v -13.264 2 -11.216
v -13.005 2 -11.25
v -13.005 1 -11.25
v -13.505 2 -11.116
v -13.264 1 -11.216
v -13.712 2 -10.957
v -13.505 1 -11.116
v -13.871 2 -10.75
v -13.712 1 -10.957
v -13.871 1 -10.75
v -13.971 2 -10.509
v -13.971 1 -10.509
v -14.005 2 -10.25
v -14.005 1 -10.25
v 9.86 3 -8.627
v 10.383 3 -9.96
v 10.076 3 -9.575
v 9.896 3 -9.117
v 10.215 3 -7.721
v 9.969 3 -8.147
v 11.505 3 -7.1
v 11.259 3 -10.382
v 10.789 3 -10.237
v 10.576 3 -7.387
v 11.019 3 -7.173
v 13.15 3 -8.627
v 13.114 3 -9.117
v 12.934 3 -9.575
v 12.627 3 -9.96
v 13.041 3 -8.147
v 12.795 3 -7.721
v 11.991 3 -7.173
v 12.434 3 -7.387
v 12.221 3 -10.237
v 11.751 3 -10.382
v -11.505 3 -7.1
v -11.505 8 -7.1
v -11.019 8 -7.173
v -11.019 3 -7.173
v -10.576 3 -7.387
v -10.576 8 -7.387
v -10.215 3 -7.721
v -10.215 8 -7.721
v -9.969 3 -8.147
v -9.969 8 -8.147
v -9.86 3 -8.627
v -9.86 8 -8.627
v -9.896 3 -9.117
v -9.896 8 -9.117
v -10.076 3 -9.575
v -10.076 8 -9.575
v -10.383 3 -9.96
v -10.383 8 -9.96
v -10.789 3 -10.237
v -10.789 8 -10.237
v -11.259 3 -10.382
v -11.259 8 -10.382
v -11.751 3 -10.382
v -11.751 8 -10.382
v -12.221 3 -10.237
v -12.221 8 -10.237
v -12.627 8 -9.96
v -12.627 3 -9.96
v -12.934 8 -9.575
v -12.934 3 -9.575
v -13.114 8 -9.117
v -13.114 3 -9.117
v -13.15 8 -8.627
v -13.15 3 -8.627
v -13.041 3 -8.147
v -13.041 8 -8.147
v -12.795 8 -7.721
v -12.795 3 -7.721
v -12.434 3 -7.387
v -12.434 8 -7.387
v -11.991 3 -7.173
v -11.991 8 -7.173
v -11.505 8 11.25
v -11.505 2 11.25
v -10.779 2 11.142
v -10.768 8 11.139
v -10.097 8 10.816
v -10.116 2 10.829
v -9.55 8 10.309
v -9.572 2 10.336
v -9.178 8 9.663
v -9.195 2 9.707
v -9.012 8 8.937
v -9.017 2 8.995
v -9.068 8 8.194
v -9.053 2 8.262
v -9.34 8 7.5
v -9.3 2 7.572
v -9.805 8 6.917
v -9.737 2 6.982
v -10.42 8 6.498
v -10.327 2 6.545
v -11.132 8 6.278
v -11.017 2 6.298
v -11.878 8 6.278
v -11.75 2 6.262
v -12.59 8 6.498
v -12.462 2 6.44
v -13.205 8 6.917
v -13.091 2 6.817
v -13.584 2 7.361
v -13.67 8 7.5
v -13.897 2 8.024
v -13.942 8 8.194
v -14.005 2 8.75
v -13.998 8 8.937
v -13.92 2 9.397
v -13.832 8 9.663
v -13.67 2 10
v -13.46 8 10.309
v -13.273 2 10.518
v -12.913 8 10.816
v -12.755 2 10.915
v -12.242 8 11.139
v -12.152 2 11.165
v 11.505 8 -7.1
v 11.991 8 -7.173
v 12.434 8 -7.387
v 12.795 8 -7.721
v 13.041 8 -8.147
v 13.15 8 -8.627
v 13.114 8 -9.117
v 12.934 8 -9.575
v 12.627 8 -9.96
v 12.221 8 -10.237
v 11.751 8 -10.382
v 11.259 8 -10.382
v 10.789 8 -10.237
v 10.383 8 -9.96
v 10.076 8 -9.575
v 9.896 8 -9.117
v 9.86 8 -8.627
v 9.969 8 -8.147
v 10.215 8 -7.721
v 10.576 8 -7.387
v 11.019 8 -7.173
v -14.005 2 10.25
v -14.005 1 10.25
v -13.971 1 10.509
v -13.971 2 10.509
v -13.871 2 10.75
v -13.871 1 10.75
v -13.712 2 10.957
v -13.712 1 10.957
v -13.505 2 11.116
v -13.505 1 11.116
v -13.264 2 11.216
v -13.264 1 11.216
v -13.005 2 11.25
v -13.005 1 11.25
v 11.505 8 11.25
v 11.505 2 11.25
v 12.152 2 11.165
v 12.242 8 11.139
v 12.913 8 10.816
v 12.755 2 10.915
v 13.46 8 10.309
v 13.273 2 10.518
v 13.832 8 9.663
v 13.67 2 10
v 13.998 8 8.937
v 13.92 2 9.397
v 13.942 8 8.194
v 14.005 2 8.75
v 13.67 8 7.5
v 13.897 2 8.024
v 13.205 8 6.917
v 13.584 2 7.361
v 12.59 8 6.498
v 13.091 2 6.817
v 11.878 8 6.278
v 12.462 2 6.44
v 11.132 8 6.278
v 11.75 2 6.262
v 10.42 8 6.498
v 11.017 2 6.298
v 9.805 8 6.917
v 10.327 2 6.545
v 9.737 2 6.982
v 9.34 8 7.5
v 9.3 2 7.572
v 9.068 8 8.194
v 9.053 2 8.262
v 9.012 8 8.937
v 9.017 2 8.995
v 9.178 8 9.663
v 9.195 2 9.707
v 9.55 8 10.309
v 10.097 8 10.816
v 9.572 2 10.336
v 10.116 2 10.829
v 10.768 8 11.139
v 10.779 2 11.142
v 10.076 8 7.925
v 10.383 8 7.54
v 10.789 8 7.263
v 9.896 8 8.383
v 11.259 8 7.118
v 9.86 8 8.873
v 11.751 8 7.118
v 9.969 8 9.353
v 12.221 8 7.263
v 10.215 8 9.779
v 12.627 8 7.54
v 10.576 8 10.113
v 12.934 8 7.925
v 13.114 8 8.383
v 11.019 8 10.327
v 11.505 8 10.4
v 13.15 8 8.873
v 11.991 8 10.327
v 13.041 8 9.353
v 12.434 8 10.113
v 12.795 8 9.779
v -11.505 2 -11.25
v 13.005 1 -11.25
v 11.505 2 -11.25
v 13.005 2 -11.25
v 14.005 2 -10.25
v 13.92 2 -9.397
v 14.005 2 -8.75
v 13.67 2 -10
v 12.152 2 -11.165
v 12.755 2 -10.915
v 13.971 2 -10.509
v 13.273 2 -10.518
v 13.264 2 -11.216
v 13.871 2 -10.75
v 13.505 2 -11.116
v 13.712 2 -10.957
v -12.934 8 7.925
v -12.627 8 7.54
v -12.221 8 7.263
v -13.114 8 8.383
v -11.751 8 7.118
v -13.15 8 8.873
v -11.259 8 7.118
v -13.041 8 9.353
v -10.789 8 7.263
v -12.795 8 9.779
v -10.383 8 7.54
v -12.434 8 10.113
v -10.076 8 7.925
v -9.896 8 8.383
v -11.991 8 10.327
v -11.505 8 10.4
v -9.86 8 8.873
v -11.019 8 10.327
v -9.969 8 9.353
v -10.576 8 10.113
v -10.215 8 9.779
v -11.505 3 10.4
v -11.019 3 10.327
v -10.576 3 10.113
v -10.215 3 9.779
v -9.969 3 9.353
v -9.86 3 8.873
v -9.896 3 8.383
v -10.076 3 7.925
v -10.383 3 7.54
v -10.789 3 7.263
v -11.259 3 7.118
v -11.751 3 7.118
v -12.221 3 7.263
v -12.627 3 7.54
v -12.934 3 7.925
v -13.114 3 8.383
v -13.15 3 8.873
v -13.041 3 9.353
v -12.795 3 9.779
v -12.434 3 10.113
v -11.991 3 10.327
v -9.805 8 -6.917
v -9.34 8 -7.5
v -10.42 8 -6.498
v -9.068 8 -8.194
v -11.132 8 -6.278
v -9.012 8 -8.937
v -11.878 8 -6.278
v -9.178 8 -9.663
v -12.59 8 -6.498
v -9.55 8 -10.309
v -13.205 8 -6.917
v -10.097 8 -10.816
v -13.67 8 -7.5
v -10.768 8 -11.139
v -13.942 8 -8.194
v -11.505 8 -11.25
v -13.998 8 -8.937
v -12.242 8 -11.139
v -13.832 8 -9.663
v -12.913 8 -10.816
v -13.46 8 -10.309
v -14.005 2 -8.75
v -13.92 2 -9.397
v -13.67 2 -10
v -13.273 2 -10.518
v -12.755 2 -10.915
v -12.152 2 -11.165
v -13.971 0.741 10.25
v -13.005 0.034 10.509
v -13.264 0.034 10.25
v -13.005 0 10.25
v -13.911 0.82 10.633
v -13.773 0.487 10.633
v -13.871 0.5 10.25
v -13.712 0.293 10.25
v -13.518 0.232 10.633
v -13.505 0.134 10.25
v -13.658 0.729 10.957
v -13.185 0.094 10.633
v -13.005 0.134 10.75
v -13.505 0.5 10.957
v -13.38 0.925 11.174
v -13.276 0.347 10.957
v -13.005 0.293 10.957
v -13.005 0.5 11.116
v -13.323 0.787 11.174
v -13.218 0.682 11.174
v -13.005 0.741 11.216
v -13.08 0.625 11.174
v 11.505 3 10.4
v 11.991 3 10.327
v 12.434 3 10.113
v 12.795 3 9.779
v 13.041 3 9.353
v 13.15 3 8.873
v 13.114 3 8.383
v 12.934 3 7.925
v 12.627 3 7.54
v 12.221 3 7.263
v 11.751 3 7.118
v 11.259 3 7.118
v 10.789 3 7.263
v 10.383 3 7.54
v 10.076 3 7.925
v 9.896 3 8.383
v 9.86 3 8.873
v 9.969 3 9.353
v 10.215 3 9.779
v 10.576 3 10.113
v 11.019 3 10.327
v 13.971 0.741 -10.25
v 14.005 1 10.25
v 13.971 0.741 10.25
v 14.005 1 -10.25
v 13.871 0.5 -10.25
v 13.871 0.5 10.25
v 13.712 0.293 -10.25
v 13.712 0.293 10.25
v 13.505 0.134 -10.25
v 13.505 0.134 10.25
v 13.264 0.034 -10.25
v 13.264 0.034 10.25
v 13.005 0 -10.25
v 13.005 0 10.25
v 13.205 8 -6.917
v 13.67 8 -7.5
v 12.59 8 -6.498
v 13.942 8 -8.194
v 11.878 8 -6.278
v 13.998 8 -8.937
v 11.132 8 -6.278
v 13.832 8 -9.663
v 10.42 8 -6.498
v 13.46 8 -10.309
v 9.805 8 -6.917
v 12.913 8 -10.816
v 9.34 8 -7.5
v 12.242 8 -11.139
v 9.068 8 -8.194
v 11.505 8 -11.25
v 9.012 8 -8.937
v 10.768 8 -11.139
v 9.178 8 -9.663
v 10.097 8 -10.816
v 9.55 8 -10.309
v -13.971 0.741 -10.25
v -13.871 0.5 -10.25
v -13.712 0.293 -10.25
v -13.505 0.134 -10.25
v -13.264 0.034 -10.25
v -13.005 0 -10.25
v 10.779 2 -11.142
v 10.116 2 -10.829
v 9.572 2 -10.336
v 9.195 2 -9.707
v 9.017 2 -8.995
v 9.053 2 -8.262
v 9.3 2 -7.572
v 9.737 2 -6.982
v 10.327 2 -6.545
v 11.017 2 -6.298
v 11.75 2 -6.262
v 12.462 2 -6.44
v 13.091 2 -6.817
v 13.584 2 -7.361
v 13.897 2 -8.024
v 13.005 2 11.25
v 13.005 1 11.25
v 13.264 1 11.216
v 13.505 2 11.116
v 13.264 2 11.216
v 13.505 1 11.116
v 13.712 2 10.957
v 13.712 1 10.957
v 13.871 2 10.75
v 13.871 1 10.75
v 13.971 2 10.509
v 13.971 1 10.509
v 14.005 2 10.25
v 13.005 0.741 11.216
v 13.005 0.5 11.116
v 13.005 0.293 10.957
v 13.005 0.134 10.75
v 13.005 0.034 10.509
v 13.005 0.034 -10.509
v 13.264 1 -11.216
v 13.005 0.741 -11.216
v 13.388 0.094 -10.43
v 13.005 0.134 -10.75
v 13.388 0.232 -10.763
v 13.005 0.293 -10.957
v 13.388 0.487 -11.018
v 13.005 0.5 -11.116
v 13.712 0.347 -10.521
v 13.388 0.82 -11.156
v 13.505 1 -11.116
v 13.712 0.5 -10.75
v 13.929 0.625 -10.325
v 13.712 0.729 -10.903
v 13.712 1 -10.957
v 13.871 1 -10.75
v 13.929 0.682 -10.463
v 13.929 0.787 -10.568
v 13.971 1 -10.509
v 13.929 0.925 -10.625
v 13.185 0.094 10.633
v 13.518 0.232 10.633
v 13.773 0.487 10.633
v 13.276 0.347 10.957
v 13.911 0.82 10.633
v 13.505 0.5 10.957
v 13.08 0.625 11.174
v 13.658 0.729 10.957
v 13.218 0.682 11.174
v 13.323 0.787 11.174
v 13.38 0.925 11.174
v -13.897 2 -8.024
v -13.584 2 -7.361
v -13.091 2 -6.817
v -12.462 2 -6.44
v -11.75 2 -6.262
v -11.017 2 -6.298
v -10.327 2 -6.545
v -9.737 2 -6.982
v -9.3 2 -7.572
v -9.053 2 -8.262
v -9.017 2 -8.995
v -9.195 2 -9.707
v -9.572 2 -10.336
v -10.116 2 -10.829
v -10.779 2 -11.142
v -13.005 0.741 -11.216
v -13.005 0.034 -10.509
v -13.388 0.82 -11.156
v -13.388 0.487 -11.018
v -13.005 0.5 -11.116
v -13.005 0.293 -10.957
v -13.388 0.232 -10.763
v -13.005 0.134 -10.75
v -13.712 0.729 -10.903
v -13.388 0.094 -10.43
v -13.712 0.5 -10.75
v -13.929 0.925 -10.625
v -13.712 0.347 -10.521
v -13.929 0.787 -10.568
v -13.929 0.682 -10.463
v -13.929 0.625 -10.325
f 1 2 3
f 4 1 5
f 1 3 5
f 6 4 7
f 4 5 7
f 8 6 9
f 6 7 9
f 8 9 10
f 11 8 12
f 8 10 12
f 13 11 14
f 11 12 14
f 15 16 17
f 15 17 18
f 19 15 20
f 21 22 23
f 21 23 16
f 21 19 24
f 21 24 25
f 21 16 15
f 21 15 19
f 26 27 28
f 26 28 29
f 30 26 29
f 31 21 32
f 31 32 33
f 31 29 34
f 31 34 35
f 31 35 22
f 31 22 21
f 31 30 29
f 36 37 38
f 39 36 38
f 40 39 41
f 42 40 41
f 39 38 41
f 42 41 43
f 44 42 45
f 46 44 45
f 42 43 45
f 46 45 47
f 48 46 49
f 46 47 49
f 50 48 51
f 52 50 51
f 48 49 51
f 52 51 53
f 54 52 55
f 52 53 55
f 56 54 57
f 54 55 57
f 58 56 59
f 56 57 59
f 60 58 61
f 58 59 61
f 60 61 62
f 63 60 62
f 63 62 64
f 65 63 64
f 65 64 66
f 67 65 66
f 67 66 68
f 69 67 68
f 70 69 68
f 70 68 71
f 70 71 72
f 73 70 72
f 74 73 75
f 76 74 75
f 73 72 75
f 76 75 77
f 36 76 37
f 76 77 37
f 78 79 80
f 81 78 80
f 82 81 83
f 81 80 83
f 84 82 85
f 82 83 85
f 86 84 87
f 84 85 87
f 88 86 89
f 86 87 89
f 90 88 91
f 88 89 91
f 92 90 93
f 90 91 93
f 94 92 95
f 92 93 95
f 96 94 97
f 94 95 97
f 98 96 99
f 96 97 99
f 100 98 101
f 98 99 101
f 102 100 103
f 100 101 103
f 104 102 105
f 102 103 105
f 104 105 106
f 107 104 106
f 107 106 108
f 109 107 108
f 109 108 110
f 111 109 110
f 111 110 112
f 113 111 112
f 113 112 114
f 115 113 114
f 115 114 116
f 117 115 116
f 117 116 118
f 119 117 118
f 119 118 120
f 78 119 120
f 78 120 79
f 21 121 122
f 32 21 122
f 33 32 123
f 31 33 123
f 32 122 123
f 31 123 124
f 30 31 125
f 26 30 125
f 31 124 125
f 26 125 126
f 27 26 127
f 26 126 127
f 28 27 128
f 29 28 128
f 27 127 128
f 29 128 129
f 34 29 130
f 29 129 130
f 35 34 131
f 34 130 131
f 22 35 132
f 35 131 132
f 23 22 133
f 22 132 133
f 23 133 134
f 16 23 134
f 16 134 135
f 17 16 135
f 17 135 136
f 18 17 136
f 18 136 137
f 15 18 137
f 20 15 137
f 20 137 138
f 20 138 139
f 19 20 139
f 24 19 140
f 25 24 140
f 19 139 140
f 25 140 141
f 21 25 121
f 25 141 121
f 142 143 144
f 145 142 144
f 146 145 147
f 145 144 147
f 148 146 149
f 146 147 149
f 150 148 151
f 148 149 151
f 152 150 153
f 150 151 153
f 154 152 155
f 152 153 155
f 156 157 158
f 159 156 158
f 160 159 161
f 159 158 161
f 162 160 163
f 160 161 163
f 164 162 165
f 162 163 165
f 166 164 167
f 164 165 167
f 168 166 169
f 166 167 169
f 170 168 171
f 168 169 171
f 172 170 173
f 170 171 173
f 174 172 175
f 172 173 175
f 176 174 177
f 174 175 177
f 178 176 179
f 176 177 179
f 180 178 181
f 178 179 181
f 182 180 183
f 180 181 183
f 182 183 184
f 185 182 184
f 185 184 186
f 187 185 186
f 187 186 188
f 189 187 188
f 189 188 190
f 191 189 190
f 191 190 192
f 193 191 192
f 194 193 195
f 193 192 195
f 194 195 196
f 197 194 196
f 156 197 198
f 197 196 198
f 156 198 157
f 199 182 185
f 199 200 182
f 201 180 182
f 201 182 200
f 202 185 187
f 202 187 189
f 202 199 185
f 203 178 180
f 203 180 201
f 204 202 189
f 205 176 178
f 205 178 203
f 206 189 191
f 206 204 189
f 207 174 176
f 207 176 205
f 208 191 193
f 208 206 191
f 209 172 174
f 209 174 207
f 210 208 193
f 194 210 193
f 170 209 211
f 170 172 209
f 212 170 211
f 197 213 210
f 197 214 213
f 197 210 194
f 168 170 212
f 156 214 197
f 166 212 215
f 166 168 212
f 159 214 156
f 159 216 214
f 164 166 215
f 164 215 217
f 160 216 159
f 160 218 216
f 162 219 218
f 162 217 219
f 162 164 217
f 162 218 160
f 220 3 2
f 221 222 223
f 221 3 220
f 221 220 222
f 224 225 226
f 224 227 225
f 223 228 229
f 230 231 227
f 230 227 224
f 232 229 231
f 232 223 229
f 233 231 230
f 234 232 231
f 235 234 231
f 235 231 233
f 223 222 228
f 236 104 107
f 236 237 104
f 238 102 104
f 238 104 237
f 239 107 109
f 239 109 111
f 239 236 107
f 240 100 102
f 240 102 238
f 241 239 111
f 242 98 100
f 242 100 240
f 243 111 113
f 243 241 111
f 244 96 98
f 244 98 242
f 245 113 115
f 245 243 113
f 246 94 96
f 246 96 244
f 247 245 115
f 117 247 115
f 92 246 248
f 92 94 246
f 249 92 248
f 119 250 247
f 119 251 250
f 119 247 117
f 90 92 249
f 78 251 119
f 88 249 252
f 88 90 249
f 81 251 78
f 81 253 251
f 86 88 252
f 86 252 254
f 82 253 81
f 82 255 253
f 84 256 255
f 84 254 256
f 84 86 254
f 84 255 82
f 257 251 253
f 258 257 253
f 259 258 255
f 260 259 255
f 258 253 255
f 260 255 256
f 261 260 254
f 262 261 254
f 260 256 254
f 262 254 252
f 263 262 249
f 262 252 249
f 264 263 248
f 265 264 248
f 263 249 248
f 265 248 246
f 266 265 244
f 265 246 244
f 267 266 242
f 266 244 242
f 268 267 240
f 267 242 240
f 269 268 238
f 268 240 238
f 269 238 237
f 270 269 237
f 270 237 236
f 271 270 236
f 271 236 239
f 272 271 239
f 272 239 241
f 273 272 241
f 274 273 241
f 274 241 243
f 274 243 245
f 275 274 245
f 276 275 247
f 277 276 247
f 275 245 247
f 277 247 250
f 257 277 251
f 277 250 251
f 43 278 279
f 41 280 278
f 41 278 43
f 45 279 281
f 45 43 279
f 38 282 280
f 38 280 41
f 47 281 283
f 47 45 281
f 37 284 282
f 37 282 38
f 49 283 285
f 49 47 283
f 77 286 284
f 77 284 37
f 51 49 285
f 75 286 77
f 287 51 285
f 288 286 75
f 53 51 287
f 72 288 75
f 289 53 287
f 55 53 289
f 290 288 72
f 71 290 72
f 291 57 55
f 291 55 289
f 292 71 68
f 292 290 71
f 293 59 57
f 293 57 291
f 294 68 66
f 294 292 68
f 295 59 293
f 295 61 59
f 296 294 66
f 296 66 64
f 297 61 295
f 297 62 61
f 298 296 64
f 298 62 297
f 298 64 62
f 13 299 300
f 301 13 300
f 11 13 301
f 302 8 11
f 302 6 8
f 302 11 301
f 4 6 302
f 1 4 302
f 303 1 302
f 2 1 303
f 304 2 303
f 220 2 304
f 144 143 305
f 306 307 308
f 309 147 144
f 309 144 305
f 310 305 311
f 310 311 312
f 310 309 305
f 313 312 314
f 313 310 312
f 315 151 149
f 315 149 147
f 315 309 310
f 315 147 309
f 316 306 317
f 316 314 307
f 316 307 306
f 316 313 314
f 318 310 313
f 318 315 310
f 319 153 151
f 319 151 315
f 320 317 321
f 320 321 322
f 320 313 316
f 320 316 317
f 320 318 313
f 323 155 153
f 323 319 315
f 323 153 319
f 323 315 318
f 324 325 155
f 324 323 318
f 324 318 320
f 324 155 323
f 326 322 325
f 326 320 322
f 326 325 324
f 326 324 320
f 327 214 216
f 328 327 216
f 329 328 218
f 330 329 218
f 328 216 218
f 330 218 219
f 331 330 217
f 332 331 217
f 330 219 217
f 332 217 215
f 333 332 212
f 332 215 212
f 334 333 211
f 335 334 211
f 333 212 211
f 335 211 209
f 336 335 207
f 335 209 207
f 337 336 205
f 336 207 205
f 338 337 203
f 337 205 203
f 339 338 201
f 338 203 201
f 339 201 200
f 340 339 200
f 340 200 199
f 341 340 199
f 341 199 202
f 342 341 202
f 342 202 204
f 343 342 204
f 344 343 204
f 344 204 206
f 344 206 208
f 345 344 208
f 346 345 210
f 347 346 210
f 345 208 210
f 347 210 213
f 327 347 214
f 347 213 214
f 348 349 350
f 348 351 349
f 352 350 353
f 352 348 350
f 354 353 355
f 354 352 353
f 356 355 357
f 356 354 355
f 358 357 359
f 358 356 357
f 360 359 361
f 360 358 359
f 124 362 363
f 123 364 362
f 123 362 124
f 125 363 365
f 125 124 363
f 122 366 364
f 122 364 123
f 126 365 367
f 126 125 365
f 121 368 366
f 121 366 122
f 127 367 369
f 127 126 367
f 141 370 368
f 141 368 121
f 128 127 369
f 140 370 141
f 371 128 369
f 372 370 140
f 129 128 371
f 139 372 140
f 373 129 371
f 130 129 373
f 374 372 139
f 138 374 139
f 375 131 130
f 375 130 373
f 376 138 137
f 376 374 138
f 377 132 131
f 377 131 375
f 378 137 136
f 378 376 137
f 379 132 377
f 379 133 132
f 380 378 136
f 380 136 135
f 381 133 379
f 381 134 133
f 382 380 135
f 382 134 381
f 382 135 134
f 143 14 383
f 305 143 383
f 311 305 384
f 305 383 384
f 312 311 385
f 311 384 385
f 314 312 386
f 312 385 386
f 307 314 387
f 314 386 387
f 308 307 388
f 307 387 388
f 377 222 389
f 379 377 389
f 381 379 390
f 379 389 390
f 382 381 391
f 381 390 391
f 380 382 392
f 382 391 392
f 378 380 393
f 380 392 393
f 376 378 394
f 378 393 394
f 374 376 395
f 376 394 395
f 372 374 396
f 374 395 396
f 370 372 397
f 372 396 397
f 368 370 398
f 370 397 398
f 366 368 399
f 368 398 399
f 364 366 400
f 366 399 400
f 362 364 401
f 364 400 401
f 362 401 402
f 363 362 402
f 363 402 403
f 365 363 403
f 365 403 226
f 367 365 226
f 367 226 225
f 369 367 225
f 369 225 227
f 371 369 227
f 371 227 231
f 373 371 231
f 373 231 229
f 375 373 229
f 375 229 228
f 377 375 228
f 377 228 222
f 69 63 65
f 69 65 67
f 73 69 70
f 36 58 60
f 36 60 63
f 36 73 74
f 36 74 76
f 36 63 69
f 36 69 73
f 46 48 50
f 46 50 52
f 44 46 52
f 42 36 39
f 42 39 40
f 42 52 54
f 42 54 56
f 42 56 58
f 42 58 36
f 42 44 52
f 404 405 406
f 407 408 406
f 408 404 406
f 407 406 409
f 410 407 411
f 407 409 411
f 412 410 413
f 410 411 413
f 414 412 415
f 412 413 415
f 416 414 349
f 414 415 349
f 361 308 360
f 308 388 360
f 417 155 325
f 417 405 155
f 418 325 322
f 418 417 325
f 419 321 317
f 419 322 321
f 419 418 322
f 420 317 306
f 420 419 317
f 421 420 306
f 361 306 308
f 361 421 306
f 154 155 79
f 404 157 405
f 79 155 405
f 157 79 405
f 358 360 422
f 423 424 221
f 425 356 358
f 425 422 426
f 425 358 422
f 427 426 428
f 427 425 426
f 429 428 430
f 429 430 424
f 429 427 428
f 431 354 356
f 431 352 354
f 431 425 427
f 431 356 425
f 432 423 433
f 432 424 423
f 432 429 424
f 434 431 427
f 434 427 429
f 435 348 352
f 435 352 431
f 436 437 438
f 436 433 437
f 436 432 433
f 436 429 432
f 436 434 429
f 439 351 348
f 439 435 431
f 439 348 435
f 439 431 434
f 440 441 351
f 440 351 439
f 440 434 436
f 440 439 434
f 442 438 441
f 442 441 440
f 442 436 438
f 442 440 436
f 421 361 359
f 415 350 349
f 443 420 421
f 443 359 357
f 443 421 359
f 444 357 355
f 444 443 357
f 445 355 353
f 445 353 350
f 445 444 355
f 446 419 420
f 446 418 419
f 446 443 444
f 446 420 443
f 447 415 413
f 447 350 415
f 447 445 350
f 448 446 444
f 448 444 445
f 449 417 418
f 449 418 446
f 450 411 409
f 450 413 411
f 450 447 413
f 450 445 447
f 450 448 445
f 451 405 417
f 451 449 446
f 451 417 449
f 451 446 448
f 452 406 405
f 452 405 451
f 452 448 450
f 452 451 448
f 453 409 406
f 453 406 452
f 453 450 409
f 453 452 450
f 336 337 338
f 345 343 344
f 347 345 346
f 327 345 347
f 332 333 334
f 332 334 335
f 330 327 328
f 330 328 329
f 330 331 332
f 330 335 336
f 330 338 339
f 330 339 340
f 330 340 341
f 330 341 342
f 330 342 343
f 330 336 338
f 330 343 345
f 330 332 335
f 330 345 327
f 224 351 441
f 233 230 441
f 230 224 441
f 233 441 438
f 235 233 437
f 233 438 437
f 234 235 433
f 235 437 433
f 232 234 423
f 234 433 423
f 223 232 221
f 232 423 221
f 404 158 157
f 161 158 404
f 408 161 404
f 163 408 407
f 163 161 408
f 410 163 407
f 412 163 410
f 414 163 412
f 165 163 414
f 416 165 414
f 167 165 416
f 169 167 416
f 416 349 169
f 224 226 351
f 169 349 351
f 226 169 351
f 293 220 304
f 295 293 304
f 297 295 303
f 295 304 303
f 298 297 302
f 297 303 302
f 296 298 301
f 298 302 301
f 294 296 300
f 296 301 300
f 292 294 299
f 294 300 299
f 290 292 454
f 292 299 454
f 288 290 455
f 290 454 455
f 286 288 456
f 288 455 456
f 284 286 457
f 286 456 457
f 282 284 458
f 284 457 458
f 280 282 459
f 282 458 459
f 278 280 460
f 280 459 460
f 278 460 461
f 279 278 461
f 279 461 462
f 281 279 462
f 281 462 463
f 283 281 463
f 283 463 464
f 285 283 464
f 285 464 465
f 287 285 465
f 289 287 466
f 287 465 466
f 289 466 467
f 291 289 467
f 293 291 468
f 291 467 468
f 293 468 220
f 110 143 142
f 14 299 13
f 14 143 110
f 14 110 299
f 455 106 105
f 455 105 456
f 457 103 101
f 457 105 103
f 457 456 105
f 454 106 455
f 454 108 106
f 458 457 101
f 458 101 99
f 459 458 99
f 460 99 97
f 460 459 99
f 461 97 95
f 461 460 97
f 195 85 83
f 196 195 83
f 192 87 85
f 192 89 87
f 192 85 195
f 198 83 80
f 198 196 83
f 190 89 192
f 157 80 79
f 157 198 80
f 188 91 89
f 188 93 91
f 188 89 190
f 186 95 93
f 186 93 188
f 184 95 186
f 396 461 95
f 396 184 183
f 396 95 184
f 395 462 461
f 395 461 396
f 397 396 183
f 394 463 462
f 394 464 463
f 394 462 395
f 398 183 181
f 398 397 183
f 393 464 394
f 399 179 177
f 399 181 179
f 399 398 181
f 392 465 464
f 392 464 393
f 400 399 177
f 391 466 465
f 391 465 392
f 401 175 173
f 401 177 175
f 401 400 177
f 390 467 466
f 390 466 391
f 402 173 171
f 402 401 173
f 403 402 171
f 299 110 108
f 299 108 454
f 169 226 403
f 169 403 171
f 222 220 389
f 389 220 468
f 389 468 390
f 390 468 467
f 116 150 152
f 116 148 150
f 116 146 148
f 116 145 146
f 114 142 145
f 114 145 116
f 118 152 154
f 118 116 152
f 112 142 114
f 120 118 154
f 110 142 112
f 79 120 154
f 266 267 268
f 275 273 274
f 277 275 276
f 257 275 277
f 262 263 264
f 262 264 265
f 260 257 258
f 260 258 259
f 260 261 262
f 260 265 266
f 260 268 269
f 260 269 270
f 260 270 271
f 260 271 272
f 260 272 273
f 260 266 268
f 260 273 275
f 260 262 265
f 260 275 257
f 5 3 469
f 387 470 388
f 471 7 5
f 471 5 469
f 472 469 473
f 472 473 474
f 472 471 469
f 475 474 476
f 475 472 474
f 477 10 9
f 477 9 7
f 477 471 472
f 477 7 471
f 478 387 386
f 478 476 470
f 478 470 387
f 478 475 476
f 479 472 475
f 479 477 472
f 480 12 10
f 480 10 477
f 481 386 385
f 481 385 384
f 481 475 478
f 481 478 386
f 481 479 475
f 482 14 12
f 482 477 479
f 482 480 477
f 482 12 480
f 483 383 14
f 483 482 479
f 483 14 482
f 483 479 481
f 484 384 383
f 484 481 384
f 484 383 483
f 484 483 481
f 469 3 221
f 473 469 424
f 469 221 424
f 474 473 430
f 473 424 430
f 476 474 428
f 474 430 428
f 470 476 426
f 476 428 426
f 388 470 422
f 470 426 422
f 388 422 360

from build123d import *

# Parameters (mm, degrees)
CROQUIS1_W              = 28.01
CROQUIS1_H              = 22.5
SALIENTE_EXTRUIR1_DEPTH = 2
CROQUIS3_R              = 2.5
SALIENTE_EXTRUIR2_DEPTH = 6
CROQUIS4_R              = 1.65
CORTAR_EXTRUIR1_DEPTH   = 5
REDONDEO1_R             = 1
REDONDEO2_R             = 1


with BuildPart() as part:
    # Croquis1 → Saliente-Extruir1 (new body)
    with BuildSketch(Plane(origin=(0, 0, 0), x_dir=(1, 0, 0), z_dir=(0, 1, 0))):
        Rectangle(CROQUIS1_W, CROQUIS1_H)
    extrude(amount=SALIENTE_EXTRUIR1_DEPTH)

    # Croquis3 → Saliente-Extruir2 (add)
    with BuildSketch(Plane(origin=(0, 2, 0), x_dir=(1, 0, 0), z_dir=(0, 1, 0))):
        with Locations(Location((-11.505, 8.75, 0), (0, 0, 90))):
            Circle(CROQUIS3_R)
        with Locations(Location((11.505, 8.75, 0), (0, 0, 90))):
            Circle(CROQUIS3_R)
        with Locations(Location((11.505, -8.75, 0), (0, 0, 270))):
            Circle(CROQUIS3_R)
        with Locations(Location((-11.505, -8.75, 0), (0, 0, 270))):
            Circle(CROQUIS3_R)
    extrude(amount=SALIENTE_EXTRUIR2_DEPTH)

    # Croquis4 → Cortar-Extruir1 (cut)
    with BuildSketch(Plane(origin=(0, 8, 0), x_dir=(1, 0, 0), z_dir=(0, 1, 0))):
        with Locations(Location((-11.505, 8.75, 0), (0, 0, 270))):
            Circle(CROQUIS4_R)
        with Locations(Location((11.505, 8.75, 0), (0, 0, 270))):
            Circle(CROQUIS4_R)
        with Locations(Location((11.505, -8.75, 0), (0, 0, 270))):
            Circle(CROQUIS4_R)
        with Locations(Location((-11.505, -8.75, 0), (0, 0, 270))):
            Circle(CROQUIS4_R)
    extrude(amount=-CORTAR_EXTRUIR1_DEPTH, mode=Mode.SUBTRACT)

    # Redondeo1
    redondeo1_edges = [part.edges().sort_by_distance(p)[0] for p in [
        (0, 0, 11.25),
        (-14.005, 0, 0),
        (0, 0, -11.25),
        (14.005, 0, 0),
    ]]
    fillet(redondeo1_edges, radius=REDONDEO1_R)

    # Redondeo2
    # the kernel refuses this fillet: 1 mm, written as the material it takes off along each edge
    with BuildSketch(Plane(origin=(-13.005, 1, 10.25), x_dir=(-1, 0, 0), z_dir=(0, 0, 1))) as redondeo2_piece_1_section:
        Polygon((0, 0), (REDONDEO2_R, 0), (REDONDEO2_R, REDONDEO2_R), (0, REDONDEO2_R), align=None)
    redondeo2_piece_1 = extrude(amount=REDONDEO2_R, mode=Mode.PRIVATE)
    redondeo2_piece_1 = redondeo2_piece_1 - Plane(origin=(-13.005, 1, 10.25), x_dir=(0.7071067811865475, 0.7071067811865475, 0), z_dir=(0, 0, 1)) * Sphere(REDONDEO2_R, mode=Mode.PRIVATE)
    add(redondeo2_piece_1, mode=Mode.SUBTRACT)
    with BuildSketch(Plane(origin=(-13.005, 1, -10.25), x_dir=(0, 0, -1), z_dir=(-1, 0, 0))) as redondeo2_piece_2_section:
        Polygon((0, 0), (REDONDEO2_R, 0), (REDONDEO2_R, REDONDEO2_R), (0, REDONDEO2_R), align=None)
    redondeo2_piece_2 = extrude(amount=REDONDEO2_R, mode=Mode.PRIVATE)
    redondeo2_piece_2 = redondeo2_piece_2 - Plane(origin=(-13.005, 1, -10.25), x_dir=(0, 0.7071067811865475, 0.7071067811865475), z_dir=(-1, 0, 0)) * Sphere(REDONDEO2_R, mode=Mode.PRIVATE)
    add(redondeo2_piece_2, mode=Mode.SUBTRACT)
    with BuildSketch(Plane(origin=(13.005, 1, 10.25), x_dir=(1, 0, 0), z_dir=(0, 0, 1))) as redondeo2_piece_3_section:
        Polygon((0, 0), (REDONDEO2_R, 0), (REDONDEO2_R, -REDONDEO2_R), (0, -REDONDEO2_R), align=None)
    redondeo2_piece_3 = extrude(amount=REDONDEO2_R, mode=Mode.PRIVATE)
    redondeo2_piece_3 = redondeo2_piece_3 - Plane(origin=(13.005, 1, 10.25), x_dir=(-0.7071067811865475, 0.7071067811865475, 0), z_dir=(0, 0, 1)) * Sphere(REDONDEO2_R, mode=Mode.PRIVATE)
    add(redondeo2_piece_3, mode=Mode.SUBTRACT)
    with BuildSketch(Plane(origin=(13.005, 1, -10.25), x_dir=(0, 0, -1), z_dir=(1, 0, 0))) as redondeo2_piece_4_section:
        Polygon((0, 0), (REDONDEO2_R, 0), (REDONDEO2_R, -REDONDEO2_R), (0, -REDONDEO2_R), align=None)
    redondeo2_piece_4 = extrude(amount=REDONDEO2_R, mode=Mode.PRIVATE)
    redondeo2_piece_4 = redondeo2_piece_4 - Plane(origin=(13.005, 1, -10.25), x_dir=(0, 0.7071067811865475, 0.7071067811865475), z_dir=(1, 0, 0)) * Sphere(REDONDEO2_R, mode=Mode.PRIVATE)
    add(redondeo2_piece_4, mode=Mode.SUBTRACT)
    with BuildSketch(Plane(origin=(14.005, 1, 11.25), x_dir=(-1, 0, 0), z_dir=(0, 1, 0)), Plane(origin=(14.005, 1, -11.25), x_dir=(0, 0, 1), z_dir=(0, 1, 0))) as redondeo2_piece_5:
        with BuildLine():
            CenterArc((REDONDEO2_R, -REDONDEO2_R), REDONDEO2_R, 90, 90)
            Line((0, -REDONDEO2_R), (0, 0))
            Line((0, 0), (REDONDEO2_R, 0))
        make_face()
    extrude(amount=3.5, mode=Mode.SUBTRACT)
    with BuildSketch(Plane(origin=(-14.005, 1, 11.25), x_dir=(1, 0, 0), z_dir=(0, 1, 0)), Plane(origin=(-14.005, 1, -11.25), x_dir=(0, 0, 1), z_dir=(0, 1, 0))) as redondeo2_piece_6:
        with BuildLine():
            CenterArc((REDONDEO2_R, REDONDEO2_R), REDONDEO2_R, 180, 90)
            Line((0, REDONDEO2_R), (0, 0))
            Line((0, 0), (REDONDEO2_R, 0))
        make_face()
    extrude(amount=3.5, mode=Mode.SUBTRACT)


solid = part.part
